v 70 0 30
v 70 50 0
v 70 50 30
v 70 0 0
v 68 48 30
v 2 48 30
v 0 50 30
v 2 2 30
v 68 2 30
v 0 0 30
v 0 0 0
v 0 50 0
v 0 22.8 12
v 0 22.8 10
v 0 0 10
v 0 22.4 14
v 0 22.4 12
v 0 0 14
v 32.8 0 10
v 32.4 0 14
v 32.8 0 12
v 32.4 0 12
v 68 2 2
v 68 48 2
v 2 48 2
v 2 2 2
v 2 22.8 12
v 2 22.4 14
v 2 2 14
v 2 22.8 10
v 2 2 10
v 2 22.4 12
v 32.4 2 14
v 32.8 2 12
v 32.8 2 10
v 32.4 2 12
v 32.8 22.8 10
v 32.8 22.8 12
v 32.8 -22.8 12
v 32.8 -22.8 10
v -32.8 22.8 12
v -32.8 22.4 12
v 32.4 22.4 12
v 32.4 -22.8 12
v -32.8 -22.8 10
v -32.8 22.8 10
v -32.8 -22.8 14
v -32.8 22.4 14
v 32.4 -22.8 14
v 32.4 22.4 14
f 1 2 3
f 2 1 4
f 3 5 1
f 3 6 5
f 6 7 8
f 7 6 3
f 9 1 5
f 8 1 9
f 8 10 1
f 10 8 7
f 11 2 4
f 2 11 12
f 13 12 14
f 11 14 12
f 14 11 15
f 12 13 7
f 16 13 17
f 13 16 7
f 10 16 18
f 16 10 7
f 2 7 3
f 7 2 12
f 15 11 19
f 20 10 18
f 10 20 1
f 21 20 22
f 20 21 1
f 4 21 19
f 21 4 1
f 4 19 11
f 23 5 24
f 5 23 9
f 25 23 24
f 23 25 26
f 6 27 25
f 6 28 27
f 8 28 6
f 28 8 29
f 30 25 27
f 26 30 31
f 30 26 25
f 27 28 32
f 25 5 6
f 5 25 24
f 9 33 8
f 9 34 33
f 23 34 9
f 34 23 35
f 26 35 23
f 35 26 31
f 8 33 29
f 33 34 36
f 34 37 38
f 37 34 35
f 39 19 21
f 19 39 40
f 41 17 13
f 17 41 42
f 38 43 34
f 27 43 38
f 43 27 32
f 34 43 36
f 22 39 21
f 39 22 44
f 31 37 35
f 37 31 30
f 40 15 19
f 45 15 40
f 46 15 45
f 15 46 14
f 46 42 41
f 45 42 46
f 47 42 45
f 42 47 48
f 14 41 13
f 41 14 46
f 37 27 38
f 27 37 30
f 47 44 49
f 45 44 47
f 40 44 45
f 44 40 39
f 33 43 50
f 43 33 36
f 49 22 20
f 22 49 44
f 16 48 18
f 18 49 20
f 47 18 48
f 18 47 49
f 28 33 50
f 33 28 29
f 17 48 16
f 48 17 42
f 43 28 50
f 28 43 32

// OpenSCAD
// Two-part enclosure for small electronics board
// Print orientation: both parts on the bed, lid on +X side of box

// ---- Box ----
box_x = 70;      // outer size in X
box_y = 50;      // outer size in Y
box_z = 30;      // outer size in Z
wall = 2;        // wall thickness
floor = 2;       // floor thickness

// ---- Lid ----
lip_w = 65.6;    // lip outer size in X
lip_y = 45.6;    // lip outer size in Y
lip_t = 1.5;     // lip thickness
lip_h = 4;       // lip height
eps = 0.2;       // clearance between lip and box opening

// Derived
lip_b = lip_w - 2 * eps;   // lip inner size in X
lip_d = lip_y - 2 * eps;   // lip inner size in Y

$fn = 64;

// Print gap
gap = 10;

module box() {
    difference() {
        cube([box_x, box_y, box_z]);
        translate([wall, wall, floor])
            cube([box_x - 2 * wall, box_y - 2 * wall, box_z - floor]);
    }
}

module lid() {
    translate([-lip_w / 2, -lip_y / 2, 0])
        union() {
            // Base plate
            cube([lip_w, lip_y, wall]);
            // Lip (printed upside down, overhangs plate)
            cube([lip_b, lip_d, lip_h]);
        }
}

box();
translate([0, 0, gap])
    lid();
